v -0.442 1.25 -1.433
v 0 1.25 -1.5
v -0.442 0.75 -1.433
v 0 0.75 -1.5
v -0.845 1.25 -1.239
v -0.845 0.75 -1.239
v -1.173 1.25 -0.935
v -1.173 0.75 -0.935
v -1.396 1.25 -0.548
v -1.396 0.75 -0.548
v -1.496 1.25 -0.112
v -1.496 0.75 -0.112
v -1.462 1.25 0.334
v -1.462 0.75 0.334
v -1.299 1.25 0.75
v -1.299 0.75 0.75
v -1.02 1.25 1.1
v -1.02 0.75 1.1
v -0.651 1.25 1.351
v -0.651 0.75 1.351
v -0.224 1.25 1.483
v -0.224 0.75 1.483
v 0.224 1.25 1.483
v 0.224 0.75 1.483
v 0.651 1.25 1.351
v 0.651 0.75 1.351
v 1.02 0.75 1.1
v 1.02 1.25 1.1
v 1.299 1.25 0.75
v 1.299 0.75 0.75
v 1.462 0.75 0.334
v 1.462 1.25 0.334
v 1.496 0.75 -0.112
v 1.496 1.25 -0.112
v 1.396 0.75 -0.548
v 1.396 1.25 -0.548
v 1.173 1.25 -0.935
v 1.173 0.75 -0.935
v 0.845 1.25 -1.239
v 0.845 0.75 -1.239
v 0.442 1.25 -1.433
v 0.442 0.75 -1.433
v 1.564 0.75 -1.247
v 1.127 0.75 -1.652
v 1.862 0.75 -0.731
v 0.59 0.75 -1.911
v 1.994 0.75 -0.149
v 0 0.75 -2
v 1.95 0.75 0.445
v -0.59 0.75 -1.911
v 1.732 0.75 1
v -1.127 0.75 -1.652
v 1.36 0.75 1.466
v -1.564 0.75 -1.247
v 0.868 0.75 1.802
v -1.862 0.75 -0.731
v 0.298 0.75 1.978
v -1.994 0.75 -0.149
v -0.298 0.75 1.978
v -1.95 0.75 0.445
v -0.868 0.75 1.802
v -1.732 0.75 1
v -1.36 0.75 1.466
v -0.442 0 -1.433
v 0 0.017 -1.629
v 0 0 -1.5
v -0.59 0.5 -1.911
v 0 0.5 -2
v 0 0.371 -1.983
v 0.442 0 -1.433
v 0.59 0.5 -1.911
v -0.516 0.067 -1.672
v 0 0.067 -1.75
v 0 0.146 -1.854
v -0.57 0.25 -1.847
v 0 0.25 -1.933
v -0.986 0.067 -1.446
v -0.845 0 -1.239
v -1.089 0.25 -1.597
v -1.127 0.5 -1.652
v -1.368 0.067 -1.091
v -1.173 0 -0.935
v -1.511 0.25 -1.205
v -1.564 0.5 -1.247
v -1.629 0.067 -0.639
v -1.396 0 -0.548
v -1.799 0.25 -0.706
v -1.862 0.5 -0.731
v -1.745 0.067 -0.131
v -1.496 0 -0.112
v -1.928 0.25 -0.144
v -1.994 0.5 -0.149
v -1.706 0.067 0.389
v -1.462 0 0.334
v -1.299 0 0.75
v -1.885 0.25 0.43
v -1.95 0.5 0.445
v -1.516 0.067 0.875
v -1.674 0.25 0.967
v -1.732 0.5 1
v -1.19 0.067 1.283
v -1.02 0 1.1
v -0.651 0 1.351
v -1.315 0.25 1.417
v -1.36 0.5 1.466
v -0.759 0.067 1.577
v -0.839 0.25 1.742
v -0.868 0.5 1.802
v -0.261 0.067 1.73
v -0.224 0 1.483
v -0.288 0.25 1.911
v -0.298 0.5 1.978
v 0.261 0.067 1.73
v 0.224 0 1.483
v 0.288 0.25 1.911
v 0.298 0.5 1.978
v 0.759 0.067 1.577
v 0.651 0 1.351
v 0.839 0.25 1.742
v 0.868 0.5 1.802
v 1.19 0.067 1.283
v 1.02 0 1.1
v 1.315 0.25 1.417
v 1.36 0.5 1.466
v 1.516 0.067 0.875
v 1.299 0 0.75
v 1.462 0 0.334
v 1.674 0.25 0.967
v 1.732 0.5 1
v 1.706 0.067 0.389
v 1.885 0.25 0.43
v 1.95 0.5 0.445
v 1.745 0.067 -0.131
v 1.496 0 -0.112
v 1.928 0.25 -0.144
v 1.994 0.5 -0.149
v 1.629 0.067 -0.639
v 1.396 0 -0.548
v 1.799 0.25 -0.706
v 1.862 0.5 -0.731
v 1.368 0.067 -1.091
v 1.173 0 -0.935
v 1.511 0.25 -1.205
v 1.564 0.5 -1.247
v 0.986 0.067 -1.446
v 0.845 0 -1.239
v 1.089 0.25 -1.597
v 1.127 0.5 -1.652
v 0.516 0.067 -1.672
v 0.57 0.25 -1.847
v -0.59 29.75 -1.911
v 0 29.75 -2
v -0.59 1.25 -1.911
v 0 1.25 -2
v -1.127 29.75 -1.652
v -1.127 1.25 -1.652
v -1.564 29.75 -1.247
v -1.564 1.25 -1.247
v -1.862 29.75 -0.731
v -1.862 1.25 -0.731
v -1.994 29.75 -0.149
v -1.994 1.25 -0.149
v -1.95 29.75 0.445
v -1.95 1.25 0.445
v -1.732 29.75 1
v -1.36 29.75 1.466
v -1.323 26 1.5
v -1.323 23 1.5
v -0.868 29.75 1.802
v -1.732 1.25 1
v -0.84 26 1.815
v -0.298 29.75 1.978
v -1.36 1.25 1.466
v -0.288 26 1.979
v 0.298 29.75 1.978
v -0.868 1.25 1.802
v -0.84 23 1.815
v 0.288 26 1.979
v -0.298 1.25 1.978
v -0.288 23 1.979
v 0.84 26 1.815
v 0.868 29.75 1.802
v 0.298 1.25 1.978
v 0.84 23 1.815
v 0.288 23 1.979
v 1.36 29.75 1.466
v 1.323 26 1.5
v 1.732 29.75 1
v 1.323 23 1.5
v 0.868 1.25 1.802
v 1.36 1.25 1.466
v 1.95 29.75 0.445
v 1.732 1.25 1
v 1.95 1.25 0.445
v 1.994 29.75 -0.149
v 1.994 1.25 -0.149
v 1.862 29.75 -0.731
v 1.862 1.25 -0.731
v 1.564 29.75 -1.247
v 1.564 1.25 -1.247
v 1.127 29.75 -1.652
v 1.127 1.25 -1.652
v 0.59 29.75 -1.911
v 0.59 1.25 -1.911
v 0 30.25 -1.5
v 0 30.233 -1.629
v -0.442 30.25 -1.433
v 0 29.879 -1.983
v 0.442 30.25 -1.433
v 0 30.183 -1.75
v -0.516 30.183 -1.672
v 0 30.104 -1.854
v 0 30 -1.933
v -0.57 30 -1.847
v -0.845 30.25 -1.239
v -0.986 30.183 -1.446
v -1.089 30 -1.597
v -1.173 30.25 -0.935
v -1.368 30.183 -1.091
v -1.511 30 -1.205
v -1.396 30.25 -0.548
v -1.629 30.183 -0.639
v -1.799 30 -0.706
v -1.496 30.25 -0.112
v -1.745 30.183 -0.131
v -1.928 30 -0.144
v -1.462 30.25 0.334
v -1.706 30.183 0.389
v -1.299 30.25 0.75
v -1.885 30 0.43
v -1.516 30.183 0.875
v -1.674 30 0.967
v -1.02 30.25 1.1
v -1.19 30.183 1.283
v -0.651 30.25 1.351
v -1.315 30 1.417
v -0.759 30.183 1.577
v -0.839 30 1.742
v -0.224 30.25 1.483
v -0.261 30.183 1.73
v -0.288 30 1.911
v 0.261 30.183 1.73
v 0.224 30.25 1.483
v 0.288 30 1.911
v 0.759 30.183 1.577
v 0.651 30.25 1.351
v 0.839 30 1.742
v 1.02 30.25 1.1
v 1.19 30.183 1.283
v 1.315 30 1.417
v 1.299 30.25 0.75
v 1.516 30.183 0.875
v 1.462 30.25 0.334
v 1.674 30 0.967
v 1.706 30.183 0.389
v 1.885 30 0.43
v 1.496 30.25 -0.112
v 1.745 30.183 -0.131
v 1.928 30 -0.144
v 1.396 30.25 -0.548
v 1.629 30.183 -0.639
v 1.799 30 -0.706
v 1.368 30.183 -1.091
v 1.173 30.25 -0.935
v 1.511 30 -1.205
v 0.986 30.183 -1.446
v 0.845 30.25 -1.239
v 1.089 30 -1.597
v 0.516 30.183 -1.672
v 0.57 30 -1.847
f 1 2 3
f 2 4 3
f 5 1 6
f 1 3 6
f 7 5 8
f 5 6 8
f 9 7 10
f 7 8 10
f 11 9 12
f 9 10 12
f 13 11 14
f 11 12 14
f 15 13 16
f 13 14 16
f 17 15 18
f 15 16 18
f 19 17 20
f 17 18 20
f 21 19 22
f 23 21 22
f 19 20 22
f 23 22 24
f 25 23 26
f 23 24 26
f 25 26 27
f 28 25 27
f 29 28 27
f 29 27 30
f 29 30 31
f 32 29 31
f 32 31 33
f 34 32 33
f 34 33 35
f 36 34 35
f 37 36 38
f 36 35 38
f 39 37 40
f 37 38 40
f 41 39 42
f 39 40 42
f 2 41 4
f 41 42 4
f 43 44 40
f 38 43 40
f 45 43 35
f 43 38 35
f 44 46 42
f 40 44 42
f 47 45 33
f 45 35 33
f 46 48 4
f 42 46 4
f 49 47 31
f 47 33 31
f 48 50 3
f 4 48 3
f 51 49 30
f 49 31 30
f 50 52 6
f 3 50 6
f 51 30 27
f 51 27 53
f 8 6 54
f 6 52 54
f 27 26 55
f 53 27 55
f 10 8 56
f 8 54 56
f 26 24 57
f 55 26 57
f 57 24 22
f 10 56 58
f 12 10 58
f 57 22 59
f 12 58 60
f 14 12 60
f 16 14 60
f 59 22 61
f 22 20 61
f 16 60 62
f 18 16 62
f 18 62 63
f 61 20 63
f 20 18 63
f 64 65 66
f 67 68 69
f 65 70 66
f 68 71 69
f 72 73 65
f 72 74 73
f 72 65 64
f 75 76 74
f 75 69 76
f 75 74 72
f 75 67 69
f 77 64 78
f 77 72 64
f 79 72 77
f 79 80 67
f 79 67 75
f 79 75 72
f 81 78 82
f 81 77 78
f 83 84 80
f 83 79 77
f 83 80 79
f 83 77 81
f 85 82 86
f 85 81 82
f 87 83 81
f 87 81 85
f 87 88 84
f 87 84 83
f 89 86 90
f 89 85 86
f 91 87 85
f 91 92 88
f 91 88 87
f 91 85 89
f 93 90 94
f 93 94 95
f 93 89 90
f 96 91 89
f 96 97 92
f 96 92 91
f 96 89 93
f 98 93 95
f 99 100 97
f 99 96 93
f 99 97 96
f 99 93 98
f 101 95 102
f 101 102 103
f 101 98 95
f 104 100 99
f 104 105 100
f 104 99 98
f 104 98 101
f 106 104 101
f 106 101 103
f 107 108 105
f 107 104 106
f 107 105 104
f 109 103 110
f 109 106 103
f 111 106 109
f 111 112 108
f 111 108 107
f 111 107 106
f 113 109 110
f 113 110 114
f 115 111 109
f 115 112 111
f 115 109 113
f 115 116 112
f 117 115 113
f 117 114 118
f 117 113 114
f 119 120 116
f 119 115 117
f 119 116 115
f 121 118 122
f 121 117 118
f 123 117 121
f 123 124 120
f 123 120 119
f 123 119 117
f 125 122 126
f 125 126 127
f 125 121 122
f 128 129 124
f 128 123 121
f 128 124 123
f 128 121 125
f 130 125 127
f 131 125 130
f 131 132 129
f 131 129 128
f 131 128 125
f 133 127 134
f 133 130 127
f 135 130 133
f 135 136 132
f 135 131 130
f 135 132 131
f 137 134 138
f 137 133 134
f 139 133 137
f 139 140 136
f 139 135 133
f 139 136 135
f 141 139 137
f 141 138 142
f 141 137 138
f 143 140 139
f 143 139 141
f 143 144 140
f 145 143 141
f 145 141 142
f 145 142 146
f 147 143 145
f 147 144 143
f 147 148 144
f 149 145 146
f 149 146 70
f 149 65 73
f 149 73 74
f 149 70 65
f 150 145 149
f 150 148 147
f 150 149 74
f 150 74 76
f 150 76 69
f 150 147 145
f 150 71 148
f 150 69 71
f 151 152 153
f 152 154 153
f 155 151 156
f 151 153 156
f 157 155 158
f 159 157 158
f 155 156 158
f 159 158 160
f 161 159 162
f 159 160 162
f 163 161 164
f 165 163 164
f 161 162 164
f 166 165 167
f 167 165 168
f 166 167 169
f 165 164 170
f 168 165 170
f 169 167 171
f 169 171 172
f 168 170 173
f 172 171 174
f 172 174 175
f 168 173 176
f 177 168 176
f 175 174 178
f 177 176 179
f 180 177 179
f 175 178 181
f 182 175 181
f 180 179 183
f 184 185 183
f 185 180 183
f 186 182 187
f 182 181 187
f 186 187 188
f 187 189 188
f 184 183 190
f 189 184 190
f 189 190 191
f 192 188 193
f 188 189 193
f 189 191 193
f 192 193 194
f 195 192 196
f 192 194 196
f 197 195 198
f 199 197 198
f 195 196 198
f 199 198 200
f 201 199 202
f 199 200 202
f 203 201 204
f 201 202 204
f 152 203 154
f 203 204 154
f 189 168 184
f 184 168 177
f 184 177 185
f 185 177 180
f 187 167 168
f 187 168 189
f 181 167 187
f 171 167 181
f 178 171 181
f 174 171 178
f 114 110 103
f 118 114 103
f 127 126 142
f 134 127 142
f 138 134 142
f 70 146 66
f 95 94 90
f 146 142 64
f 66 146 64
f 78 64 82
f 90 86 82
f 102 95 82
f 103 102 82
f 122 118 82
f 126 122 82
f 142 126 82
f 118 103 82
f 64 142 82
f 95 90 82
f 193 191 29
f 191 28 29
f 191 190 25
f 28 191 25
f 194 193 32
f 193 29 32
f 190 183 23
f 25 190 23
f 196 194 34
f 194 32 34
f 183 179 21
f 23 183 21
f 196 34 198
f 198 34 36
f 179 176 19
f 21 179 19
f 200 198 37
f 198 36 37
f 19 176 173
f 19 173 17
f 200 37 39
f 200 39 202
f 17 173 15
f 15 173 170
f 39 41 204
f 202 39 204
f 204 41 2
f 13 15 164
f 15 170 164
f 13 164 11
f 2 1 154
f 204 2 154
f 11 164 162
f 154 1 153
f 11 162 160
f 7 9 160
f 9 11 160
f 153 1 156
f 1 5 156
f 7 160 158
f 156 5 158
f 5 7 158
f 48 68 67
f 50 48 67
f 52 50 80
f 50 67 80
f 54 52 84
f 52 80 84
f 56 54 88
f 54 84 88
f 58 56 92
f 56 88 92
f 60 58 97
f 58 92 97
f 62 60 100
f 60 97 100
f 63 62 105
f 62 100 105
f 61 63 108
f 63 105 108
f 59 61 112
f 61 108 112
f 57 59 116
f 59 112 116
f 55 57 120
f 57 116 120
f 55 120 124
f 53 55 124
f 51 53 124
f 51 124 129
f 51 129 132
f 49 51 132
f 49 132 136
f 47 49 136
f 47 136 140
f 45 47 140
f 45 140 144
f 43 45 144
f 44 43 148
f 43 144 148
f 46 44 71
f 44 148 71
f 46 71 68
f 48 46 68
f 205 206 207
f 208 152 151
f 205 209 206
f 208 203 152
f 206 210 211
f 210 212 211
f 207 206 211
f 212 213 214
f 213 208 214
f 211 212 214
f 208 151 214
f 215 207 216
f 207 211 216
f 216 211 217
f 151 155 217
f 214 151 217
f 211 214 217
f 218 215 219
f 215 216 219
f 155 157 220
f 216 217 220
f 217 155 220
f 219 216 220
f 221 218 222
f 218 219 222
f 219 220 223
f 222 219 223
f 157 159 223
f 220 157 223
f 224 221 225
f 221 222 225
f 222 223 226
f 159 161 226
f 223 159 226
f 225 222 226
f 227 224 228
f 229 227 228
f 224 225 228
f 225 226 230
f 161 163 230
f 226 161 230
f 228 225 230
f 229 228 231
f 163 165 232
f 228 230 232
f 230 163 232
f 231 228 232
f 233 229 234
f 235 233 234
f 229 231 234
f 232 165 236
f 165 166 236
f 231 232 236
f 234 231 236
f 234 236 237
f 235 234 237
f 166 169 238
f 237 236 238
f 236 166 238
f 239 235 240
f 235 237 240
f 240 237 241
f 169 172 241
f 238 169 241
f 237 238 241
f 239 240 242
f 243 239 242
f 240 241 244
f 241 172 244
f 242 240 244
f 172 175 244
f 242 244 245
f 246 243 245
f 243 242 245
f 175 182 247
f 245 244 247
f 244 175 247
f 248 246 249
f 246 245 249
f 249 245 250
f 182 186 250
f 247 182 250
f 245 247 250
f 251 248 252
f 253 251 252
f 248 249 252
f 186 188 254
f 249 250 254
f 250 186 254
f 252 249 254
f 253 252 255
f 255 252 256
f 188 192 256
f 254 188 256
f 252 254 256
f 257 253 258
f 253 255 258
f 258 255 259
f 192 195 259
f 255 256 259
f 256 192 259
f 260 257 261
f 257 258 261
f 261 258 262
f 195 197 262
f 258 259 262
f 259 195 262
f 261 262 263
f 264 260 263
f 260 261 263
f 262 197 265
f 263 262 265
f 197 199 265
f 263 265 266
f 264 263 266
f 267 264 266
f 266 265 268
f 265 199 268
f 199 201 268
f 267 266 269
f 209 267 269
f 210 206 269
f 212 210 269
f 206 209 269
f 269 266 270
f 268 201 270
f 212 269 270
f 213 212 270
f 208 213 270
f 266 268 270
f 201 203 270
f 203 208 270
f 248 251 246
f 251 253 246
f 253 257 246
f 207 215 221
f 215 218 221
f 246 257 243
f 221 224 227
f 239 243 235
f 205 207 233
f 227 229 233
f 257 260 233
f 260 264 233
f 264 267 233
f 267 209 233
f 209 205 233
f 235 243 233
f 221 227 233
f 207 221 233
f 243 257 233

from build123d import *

# Parameters (mm, degrees)
FILLET1_R          = 0.5
CUT_EXTRUDE1_START = 1.5
SKETCH2_W          = 4
SKETCH2_H          = 3
CUT_EXTRUDE1_DEPTH = 29.881943651


with BuildPart() as part:
    # Sketch1 → Revolve1 (revolve)
    with BuildSketch(Plane.XY, mode=Mode.PRIVATE) as revolve1_sk:
        Polygon((-2, 0), (0, 0), (0, 30.25), (-2, 30.25), (-2, 1.25), (-1.5, 1.25), (-1.5, 0.75), (-2, 0.75), align=None)
    revolve(revolve1_sk.sketch.rotate(Axis((0, 0, 0), (0, 1, 0)), 270), axis=Axis((0, 0, 0), (0, 1, 0)))

    # Fillet1
    fillet1_edges = [part.edges().sort_by_distance(p)[0] for p in [
        (0, 30.25, 2),
        (0, 0, 2),
    ]]
    fillet(fillet1_edges, radius=FILLET1_R)

    # Sketch2 → Cut-Extrude1 (cut, through all)
    with BuildSketch(Plane.XY.offset(CUT_EXTRUDE1_START)):
        with Locations((0, 24.5)):
            Rectangle(SKETCH2_W, SKETCH2_H)
    extrude(amount=CUT_EXTRUDE1_DEPTH, mode=Mode.SUBTRACT)


solid = part.part
